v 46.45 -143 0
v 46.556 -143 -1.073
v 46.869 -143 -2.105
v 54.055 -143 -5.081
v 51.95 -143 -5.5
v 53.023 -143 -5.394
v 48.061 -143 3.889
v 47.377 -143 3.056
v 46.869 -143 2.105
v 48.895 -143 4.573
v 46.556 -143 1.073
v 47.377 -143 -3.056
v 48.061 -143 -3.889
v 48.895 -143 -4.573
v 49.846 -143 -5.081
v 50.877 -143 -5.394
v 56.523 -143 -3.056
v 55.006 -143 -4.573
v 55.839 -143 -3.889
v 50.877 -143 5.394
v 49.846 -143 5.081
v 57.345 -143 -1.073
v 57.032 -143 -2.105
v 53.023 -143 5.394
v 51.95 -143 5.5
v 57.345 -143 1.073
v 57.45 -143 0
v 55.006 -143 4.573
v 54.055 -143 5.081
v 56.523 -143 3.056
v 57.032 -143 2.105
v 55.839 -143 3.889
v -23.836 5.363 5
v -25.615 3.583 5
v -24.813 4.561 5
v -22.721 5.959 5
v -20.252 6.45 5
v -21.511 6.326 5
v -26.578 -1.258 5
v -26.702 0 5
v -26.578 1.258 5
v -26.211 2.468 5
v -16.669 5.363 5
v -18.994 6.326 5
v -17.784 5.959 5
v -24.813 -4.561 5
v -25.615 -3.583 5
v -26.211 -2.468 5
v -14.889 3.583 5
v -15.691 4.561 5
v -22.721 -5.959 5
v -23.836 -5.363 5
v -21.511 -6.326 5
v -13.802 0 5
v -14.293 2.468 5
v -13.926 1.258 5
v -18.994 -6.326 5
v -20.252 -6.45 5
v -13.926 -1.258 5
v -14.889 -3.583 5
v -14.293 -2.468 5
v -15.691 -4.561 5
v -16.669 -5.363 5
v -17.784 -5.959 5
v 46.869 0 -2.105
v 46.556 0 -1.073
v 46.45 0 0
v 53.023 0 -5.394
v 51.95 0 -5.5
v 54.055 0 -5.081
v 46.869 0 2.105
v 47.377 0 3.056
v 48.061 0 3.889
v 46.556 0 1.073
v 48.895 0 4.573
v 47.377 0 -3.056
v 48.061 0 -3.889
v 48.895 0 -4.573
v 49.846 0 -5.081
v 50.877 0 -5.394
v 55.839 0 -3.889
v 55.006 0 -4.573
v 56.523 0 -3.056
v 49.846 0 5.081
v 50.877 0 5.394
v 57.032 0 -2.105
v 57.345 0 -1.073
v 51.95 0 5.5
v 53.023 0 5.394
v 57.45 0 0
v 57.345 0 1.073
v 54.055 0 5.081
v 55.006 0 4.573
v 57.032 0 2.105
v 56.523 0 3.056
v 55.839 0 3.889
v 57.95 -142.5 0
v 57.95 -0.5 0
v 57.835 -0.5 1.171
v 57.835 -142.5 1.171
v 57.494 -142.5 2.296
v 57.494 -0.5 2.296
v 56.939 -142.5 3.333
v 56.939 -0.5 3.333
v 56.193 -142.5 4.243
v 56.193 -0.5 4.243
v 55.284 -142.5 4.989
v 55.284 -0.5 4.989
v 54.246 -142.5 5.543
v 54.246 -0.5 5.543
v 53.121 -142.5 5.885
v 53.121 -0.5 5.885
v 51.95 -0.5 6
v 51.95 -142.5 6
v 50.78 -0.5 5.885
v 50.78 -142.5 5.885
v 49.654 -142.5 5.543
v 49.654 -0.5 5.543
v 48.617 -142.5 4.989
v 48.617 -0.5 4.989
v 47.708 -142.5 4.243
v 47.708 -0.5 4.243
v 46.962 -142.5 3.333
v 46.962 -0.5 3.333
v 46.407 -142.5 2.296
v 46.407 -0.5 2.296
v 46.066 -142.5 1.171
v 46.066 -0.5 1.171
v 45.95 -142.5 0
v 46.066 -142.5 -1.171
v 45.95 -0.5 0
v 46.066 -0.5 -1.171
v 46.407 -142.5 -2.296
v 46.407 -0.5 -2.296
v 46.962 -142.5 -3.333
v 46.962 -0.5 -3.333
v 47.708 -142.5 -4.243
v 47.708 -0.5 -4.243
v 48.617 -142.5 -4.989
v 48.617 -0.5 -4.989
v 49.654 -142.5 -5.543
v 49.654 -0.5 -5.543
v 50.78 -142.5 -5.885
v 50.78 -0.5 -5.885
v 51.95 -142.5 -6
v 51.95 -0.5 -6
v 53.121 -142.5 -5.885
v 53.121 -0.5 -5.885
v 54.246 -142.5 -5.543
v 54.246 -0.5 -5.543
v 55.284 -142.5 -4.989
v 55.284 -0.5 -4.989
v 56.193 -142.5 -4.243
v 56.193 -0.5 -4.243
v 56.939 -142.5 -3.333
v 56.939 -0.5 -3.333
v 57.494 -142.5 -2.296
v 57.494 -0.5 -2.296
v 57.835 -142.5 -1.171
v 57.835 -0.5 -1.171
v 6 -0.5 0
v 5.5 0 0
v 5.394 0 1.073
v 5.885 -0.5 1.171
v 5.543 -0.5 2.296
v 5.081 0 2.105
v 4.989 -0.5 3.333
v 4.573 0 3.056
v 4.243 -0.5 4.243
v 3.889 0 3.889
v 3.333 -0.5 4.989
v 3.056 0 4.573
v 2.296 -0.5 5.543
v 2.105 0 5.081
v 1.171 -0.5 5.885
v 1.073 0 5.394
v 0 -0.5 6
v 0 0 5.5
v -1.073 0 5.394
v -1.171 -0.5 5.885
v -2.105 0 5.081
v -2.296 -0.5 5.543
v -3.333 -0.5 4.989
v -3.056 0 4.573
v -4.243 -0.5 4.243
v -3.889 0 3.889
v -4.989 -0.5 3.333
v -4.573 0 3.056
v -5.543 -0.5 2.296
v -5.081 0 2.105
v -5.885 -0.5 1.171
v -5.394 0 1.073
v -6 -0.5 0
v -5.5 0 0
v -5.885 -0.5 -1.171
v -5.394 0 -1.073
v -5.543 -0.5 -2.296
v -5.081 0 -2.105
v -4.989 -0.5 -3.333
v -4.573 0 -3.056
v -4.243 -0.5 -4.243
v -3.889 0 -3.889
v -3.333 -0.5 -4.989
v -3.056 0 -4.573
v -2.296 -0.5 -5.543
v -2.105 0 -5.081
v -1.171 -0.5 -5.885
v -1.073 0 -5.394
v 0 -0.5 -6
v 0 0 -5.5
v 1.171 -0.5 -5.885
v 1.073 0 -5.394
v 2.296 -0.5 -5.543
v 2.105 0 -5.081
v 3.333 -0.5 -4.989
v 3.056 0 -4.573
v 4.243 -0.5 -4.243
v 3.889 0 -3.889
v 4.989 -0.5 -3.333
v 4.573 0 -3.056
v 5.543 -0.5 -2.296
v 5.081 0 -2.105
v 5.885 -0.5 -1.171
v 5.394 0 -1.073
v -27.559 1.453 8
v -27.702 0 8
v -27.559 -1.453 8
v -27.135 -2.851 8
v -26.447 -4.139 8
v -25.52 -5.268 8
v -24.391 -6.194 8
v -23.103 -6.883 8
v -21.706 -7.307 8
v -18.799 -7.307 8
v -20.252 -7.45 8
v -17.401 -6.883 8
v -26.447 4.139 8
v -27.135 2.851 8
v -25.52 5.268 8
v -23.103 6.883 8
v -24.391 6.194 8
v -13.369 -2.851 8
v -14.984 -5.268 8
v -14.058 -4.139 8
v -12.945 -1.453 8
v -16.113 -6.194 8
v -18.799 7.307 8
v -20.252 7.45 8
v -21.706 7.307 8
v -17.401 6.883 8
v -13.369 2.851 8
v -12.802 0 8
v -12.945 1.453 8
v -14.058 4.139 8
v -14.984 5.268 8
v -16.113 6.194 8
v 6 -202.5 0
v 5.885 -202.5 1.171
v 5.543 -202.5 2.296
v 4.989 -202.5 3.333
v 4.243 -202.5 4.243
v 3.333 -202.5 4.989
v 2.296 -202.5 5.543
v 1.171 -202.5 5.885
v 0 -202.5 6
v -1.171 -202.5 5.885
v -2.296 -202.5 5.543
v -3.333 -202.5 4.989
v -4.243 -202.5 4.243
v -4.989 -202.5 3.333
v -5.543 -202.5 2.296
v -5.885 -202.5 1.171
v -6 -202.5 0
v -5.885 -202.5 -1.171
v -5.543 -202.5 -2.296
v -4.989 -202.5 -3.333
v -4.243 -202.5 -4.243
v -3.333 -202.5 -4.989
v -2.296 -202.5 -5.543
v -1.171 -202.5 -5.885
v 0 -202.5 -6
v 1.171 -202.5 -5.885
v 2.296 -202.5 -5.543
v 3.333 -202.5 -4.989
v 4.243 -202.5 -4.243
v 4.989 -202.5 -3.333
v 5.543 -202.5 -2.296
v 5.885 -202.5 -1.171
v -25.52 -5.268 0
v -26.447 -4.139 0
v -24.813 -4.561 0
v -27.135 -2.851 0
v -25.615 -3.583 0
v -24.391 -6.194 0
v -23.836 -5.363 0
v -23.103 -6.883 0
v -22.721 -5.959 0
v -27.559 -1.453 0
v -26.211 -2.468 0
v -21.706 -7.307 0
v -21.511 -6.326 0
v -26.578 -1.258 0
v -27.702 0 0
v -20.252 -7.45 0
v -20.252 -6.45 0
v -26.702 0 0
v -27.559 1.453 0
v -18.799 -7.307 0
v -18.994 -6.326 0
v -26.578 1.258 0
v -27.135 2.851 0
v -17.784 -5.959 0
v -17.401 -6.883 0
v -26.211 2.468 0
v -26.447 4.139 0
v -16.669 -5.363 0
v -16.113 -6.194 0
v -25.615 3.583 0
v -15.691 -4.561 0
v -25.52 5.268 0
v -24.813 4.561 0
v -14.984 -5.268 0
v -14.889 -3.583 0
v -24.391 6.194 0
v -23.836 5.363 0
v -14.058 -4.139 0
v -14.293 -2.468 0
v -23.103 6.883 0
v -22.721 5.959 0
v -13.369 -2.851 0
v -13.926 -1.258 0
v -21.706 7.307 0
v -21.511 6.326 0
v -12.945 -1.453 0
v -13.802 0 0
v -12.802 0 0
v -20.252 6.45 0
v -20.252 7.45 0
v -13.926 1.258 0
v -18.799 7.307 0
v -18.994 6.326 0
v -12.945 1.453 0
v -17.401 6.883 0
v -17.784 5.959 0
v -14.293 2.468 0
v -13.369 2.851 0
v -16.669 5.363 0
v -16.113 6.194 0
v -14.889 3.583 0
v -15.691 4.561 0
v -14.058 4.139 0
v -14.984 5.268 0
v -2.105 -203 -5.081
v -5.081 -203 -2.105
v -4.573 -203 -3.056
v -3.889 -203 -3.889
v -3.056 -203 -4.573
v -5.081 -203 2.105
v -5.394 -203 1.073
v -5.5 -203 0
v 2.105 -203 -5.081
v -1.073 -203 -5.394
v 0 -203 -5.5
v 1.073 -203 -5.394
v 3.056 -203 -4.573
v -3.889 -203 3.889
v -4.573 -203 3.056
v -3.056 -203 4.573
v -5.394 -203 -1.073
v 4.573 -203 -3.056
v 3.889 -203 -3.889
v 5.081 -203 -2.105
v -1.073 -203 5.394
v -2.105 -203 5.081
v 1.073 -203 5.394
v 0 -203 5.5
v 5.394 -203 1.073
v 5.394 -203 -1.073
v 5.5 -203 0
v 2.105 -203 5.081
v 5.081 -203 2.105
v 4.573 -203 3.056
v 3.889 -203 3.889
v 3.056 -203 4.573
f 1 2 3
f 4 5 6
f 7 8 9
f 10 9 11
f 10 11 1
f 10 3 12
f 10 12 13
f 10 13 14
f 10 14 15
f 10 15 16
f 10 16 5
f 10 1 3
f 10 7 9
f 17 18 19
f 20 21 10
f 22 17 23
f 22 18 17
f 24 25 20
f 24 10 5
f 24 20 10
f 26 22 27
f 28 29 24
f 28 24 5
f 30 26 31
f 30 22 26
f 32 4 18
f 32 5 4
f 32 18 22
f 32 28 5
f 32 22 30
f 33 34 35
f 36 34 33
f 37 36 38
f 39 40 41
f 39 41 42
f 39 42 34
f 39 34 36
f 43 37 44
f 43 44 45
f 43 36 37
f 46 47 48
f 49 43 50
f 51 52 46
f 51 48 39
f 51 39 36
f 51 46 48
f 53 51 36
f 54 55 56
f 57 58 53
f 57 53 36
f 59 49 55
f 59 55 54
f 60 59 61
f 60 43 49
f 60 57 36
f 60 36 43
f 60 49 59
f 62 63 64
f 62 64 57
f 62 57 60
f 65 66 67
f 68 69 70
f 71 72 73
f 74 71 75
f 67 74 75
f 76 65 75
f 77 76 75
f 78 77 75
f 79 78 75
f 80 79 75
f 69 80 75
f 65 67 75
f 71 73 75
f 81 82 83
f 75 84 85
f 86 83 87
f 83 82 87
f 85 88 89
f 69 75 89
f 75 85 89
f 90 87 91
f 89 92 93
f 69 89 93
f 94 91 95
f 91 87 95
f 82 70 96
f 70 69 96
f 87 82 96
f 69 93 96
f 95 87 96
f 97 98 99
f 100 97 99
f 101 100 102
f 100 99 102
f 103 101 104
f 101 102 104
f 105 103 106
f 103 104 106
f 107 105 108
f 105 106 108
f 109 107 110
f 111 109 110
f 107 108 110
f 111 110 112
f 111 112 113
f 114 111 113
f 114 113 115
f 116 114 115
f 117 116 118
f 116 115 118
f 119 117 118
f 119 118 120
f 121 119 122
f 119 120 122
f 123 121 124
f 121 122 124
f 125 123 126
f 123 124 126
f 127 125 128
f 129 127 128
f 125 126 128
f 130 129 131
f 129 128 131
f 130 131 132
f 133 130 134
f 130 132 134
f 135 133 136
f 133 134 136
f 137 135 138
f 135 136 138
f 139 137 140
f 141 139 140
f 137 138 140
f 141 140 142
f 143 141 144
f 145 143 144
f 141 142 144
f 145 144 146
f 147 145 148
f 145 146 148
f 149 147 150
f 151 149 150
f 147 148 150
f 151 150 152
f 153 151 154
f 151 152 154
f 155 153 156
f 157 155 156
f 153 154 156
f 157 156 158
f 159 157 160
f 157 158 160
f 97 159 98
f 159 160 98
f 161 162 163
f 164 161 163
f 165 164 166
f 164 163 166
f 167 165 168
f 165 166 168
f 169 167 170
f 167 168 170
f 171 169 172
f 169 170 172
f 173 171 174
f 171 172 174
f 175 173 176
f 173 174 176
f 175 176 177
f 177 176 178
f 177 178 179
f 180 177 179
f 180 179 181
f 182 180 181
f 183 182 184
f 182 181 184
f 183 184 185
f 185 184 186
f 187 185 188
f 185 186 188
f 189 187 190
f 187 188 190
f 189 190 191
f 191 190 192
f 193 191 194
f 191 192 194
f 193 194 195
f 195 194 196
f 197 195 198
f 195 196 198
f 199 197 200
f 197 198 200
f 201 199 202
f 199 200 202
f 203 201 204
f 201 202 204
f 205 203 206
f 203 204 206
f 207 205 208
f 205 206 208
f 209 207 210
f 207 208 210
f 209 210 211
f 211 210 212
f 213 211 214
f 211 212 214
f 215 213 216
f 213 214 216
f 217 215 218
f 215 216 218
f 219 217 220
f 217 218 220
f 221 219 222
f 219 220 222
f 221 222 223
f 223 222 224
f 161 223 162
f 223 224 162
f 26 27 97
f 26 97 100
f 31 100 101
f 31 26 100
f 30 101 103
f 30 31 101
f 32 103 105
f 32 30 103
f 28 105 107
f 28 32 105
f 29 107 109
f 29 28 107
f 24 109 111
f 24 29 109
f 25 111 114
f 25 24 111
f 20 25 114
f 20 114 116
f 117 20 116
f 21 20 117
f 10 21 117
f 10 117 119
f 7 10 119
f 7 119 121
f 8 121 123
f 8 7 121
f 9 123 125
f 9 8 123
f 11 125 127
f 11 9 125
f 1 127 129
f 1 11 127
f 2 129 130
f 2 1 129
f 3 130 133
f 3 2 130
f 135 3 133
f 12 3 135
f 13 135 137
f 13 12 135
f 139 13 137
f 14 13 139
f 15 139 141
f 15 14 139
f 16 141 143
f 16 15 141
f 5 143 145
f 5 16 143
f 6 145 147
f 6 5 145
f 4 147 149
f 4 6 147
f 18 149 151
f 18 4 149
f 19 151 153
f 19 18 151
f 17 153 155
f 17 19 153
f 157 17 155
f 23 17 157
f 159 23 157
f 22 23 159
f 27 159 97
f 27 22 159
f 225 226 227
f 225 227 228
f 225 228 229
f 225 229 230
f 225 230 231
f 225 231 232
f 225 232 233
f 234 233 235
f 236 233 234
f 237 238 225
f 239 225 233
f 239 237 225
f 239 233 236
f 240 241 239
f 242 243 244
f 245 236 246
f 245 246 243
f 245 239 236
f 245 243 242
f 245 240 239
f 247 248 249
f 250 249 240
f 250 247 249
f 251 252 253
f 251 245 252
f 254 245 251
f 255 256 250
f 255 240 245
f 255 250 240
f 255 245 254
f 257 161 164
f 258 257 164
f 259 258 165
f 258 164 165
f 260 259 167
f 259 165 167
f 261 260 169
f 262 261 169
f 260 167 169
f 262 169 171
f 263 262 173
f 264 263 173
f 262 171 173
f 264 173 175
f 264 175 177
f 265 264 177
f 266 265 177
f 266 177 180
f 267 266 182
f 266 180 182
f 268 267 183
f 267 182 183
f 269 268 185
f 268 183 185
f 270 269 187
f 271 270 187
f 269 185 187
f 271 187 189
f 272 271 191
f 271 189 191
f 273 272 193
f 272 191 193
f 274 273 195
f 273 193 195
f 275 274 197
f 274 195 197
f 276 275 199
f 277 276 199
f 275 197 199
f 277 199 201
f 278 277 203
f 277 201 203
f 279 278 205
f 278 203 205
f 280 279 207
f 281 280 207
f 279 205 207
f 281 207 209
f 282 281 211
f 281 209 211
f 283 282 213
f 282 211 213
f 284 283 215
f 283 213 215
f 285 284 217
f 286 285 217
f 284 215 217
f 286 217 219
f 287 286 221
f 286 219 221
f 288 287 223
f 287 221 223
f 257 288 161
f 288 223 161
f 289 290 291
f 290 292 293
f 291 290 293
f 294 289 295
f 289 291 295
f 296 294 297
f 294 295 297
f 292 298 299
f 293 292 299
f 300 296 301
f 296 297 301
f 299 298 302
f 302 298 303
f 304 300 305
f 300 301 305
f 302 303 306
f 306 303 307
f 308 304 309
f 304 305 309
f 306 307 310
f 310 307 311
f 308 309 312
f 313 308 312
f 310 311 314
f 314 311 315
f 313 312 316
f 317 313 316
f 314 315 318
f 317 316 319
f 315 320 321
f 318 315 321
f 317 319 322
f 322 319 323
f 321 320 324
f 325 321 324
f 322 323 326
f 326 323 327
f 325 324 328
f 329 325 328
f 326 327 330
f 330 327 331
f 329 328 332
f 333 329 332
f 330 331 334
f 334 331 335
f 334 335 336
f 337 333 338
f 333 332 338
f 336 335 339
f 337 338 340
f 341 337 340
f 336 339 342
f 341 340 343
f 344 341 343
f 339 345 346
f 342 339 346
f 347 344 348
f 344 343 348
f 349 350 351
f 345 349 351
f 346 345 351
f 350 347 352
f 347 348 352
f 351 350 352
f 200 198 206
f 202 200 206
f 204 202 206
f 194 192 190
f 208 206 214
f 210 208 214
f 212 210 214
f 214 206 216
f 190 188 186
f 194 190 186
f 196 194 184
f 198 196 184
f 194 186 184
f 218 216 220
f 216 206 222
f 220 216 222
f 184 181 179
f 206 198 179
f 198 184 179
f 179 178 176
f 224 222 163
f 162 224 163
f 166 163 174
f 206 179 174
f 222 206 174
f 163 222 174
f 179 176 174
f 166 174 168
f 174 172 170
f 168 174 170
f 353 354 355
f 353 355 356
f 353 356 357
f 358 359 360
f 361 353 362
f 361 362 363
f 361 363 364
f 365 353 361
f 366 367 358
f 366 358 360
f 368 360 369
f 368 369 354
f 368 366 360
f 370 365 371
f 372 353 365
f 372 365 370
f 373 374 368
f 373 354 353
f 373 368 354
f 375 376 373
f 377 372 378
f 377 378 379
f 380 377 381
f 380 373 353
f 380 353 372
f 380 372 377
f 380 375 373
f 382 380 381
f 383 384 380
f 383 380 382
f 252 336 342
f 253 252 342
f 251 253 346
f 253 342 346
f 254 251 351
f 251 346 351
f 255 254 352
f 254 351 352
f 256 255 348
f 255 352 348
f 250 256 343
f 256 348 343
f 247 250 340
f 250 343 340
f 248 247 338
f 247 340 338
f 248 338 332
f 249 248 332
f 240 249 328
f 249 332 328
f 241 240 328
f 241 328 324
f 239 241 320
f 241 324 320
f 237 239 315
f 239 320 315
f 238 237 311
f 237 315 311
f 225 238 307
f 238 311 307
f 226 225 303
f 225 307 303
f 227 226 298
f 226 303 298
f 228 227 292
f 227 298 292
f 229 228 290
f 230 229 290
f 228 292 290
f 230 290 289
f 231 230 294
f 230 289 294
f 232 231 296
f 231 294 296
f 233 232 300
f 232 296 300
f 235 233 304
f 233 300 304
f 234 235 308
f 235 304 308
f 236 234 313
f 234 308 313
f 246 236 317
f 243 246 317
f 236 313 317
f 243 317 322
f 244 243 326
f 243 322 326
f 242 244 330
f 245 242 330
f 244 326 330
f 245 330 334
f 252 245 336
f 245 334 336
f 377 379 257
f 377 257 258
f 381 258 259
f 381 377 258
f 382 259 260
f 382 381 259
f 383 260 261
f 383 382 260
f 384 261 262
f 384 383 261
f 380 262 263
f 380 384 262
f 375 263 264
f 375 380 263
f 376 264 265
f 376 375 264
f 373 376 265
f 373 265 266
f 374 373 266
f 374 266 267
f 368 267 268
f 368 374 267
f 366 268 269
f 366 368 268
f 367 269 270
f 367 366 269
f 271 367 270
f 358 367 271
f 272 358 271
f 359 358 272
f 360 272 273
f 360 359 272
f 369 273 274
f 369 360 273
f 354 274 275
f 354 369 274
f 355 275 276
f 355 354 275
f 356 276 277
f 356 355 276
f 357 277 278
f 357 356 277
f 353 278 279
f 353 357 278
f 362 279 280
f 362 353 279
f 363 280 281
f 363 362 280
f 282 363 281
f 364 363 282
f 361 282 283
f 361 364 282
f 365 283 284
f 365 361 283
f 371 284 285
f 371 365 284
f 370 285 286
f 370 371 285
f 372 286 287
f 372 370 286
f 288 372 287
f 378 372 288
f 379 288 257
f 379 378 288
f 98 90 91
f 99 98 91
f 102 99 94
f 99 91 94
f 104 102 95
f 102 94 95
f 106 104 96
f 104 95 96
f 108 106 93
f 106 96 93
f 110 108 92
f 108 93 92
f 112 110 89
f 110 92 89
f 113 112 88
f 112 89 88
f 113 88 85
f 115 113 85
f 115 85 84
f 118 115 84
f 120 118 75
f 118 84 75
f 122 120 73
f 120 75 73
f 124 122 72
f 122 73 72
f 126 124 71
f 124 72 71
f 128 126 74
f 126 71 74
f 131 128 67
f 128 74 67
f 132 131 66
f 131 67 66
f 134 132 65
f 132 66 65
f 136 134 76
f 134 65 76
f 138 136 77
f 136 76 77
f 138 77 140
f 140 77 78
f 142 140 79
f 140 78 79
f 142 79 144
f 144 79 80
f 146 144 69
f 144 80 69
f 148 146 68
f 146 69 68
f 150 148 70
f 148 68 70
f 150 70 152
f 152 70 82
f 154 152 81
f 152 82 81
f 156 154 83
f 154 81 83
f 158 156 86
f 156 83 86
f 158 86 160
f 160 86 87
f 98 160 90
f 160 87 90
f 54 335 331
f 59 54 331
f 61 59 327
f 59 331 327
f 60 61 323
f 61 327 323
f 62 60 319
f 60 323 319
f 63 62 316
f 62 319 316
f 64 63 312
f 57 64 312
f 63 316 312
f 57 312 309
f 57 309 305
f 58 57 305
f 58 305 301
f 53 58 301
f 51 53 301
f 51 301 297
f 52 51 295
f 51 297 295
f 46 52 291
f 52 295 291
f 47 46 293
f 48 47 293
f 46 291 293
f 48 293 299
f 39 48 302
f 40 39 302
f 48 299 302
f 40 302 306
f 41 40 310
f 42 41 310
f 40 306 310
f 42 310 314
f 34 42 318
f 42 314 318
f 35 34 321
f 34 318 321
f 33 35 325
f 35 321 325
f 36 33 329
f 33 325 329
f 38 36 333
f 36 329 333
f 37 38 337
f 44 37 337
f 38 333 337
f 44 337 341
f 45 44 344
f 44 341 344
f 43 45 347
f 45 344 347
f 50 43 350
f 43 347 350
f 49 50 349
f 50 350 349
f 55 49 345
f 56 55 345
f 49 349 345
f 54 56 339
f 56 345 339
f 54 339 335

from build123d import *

# Parameters (mm, degrees)
F0_R     = 6
F1_DEPTH = 203
F2_SIZE  = 0.5
F3_DEPTH = 143
F4_SIZE  = 0.5
F5_R     = 7.45
F6_DEPTH = 8
F7_R     = 6.45
F8_DEPTH = 5


with BuildPart() as f1:
    # F0 (on Front) → F1 (new body)
    with BuildSketch(Plane.XZ):
        Circle(F0_R)
    extrude(amount=F1_DEPTH)

    # F2
    f2_edges = [f1.edges().sort_by_distance(p)[0] for p in [
        (-6, -203, 0),
        (-6, 0, 0),
    ]]
    chamfer(f2_edges, length=F2_SIZE)


with BuildPart() as f3:
    # F0 (on Front) → F3 (new body)
    with BuildSketch(Plane.XZ):
        with Locations((51.95038, 0)):
            Circle(F0_R)
    extrude(amount=F3_DEPTH)

    # F4
    f4_edges = [f3.edges().sort_by_distance(p)[0] for p in [
        (45.95038, -143, 0),
        (45.95038, 0, 0),
    ]]
    chamfer(f4_edges, length=F4_SIZE)


with BuildPart() as f6:
    # F5 (on Top) → F6 (new body)
    with BuildSketch(Plane.XY):
        with Locations((-20.252213, 0)):
            Circle(F5_R)
    extrude(amount=F6_DEPTH)

    # F7 (on face) → F8 (cut)
    with BuildSketch(Plane(origin=(0, 0, 0), x_dir=(1, 0, 0), z_dir=(0, 0, -1))):
        with Locations((-20.252213, 0)):
            Circle(F7_R)
    extrude(amount=-F8_DEPTH, mode=Mode.SUBTRACT)


solid = Compound([f1.part, f3.part, f6.part])
